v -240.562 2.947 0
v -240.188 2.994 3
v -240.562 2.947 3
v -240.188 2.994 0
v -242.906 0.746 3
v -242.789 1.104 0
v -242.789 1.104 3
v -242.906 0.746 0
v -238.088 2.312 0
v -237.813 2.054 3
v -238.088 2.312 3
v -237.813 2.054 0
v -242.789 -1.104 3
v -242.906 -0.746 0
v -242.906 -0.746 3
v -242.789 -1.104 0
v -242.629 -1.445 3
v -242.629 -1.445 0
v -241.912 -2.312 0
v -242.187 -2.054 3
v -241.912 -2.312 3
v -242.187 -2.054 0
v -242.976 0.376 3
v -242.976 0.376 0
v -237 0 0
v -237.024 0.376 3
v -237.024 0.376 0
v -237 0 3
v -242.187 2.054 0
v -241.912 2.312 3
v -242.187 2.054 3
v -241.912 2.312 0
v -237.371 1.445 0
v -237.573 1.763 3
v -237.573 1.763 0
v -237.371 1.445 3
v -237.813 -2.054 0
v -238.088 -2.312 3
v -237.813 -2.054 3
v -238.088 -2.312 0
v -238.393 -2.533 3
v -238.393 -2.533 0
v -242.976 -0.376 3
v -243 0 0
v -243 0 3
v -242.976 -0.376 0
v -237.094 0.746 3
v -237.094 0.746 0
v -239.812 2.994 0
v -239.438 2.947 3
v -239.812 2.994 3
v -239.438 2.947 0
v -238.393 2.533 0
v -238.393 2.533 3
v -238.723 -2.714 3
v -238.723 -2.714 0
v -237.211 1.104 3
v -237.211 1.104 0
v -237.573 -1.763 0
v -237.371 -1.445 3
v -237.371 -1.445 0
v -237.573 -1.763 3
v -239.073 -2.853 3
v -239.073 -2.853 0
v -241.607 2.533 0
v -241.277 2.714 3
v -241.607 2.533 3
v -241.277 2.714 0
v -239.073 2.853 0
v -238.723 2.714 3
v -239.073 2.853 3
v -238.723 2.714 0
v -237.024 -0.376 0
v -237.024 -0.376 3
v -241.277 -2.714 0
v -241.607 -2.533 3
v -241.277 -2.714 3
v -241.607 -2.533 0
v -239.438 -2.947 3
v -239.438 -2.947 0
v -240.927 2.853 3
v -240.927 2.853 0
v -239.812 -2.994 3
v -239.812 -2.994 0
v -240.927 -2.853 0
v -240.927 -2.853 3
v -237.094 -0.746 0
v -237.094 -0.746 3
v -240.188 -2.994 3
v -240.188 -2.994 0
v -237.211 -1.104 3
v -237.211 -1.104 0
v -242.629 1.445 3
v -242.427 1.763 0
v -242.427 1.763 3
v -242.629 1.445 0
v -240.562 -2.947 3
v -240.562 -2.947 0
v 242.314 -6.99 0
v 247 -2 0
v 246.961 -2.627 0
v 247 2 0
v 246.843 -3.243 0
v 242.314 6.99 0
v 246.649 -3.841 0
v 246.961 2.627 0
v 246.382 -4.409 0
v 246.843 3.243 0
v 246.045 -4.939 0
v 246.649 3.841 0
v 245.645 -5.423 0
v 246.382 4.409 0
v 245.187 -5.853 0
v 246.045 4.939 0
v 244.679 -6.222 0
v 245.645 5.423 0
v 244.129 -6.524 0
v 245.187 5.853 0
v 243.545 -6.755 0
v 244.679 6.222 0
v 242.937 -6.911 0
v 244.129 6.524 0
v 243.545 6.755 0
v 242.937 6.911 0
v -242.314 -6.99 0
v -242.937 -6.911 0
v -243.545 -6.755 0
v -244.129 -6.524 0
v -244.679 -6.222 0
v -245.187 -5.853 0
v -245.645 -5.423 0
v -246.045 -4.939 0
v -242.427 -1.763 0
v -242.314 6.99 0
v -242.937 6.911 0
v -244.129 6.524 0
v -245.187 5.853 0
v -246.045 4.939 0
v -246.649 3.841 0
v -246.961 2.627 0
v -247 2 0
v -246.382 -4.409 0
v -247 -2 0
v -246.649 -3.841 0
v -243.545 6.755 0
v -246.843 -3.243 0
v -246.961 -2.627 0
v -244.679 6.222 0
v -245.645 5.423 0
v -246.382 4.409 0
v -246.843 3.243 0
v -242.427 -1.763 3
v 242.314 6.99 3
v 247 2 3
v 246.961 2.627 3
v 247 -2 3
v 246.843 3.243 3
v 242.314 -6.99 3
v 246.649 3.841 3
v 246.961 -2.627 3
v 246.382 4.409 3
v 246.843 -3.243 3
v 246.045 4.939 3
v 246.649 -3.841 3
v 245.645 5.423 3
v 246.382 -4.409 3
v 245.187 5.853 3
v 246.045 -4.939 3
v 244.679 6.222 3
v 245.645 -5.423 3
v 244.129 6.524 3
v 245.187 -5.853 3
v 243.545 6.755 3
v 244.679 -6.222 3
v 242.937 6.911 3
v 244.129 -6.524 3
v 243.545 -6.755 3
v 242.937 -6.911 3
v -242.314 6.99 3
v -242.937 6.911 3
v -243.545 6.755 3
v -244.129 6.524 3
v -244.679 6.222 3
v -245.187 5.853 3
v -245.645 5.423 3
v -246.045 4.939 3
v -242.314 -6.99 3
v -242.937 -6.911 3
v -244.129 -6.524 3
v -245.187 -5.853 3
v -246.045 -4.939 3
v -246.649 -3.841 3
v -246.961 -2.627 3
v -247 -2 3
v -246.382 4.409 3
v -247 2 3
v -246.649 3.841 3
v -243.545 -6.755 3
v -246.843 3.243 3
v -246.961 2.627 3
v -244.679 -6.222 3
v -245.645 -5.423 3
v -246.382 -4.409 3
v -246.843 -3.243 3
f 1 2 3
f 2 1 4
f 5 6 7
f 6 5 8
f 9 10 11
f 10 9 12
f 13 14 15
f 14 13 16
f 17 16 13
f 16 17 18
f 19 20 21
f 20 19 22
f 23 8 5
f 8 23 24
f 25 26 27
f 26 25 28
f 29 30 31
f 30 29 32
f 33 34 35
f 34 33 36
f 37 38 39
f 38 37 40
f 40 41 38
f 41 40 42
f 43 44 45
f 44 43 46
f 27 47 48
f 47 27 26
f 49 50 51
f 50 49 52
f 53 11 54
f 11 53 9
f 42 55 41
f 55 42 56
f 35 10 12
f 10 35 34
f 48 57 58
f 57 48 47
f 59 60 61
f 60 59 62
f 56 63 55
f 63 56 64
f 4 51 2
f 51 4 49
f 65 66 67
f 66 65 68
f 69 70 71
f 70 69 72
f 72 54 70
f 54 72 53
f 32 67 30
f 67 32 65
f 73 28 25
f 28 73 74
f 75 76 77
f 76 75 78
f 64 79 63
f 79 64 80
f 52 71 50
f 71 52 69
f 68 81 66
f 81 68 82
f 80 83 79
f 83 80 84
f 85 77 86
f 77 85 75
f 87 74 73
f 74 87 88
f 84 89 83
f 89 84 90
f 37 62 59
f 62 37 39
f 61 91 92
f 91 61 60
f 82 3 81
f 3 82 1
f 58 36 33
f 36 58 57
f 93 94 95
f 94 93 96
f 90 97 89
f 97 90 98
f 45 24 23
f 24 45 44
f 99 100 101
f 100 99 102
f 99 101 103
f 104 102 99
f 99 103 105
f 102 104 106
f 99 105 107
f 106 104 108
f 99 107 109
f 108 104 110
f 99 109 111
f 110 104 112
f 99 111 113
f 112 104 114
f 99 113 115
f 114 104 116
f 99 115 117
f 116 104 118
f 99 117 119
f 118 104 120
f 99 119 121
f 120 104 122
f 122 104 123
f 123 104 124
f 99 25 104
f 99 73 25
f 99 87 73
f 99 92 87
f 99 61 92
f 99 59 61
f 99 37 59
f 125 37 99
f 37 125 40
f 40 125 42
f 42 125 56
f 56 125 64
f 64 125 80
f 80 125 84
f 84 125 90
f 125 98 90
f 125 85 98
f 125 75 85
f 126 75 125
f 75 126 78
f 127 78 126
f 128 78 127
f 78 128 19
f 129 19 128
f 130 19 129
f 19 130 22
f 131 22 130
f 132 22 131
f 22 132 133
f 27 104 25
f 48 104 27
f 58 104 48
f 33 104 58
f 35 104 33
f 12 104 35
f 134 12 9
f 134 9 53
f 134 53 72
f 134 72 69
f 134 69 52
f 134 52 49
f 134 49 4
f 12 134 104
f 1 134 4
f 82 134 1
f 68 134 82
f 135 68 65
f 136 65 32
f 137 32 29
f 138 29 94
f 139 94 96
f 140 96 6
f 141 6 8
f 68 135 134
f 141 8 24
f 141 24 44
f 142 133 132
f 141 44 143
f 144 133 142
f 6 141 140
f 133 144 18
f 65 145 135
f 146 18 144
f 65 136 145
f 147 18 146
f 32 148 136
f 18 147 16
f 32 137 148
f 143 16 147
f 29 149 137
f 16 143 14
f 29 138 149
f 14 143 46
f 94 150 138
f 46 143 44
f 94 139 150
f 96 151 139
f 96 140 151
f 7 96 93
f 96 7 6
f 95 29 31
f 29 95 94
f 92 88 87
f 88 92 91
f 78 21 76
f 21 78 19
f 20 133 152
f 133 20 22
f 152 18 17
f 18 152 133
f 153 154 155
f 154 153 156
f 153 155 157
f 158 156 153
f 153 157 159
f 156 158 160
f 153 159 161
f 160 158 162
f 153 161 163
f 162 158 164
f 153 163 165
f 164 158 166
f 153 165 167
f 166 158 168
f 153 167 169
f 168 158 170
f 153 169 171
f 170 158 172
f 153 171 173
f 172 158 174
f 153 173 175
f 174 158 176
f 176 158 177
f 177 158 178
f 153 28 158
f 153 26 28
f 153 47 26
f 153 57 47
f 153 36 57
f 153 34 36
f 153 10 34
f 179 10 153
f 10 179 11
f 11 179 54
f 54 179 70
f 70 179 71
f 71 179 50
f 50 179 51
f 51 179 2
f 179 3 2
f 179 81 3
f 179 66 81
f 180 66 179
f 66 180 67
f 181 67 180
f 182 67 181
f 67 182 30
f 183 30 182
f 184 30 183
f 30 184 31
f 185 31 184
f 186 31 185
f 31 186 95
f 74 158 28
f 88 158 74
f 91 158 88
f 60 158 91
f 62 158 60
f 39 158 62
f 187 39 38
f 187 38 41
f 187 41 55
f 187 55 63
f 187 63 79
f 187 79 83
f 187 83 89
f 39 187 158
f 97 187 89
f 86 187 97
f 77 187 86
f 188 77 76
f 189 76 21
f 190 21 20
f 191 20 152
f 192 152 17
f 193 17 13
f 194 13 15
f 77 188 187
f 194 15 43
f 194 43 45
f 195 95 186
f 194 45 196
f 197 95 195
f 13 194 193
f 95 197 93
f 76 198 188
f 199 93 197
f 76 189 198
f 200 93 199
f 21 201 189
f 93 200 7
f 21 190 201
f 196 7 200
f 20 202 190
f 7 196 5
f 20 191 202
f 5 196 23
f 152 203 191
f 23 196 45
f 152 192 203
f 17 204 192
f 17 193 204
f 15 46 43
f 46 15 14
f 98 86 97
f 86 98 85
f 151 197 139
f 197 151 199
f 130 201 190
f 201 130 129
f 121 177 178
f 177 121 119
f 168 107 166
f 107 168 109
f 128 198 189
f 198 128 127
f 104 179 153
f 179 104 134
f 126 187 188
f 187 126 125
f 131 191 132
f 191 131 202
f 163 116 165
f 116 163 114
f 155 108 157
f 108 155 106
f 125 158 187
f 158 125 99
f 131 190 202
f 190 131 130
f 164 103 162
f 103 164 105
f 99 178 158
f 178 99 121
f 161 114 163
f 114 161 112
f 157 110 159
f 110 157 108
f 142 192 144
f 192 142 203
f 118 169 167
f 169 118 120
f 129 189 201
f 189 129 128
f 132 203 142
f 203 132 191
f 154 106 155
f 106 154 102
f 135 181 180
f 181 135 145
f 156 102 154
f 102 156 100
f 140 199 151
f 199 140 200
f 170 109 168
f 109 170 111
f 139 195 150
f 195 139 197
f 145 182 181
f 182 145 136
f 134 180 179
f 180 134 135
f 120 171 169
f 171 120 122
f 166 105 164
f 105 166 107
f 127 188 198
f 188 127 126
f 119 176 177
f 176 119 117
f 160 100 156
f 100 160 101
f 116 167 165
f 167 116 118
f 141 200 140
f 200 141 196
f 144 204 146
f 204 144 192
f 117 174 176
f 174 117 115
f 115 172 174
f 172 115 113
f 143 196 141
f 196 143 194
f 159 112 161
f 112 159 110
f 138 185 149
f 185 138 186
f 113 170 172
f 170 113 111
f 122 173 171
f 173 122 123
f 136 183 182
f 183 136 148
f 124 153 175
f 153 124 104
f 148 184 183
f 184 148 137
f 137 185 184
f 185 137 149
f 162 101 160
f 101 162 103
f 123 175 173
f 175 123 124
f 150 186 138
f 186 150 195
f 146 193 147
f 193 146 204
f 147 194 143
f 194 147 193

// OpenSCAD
$fn = 50;


difference() {
	union() {
		hull() {
			translate(v = [-242.0000000000, 2.0000000000, 0]) {
				cylinder(h = 3, r = 5);
			}
			translate(v = [242.0000000000, 2.0000000000, 0]) {
				cylinder(h = 3, r = 5);
			}
			translate(v = [-242.0000000000, -2.0000000000, 0]) {
				cylinder(h = 3, r = 5);
			}
			translate(v = [242.0000000000, -2.0000000000, 0]) {
				cylinder(h = 3, r = 5);
			}
		}
	}
	union() {
		translate(v = [-240.0000000000, 0.0000000000, 0]) {
			cylinder(h = 3, r = 3.0000000000);
		}
		translate(v = [-240.0000000000, 0.0000000000, 0]) {
			cylinder(h = 3, r = 1.5000000000);
		}
		translate(v = [-240.0000000000, 0.0000000000, 0]) {
			cylinder(h = 3, r = 1.5000000000);
		}
		translate(v = [-240.0000000000, 0.0000000000, 0]) {
			cylinder(h = 3, r = 1.5000000000);
		}
	}
}
